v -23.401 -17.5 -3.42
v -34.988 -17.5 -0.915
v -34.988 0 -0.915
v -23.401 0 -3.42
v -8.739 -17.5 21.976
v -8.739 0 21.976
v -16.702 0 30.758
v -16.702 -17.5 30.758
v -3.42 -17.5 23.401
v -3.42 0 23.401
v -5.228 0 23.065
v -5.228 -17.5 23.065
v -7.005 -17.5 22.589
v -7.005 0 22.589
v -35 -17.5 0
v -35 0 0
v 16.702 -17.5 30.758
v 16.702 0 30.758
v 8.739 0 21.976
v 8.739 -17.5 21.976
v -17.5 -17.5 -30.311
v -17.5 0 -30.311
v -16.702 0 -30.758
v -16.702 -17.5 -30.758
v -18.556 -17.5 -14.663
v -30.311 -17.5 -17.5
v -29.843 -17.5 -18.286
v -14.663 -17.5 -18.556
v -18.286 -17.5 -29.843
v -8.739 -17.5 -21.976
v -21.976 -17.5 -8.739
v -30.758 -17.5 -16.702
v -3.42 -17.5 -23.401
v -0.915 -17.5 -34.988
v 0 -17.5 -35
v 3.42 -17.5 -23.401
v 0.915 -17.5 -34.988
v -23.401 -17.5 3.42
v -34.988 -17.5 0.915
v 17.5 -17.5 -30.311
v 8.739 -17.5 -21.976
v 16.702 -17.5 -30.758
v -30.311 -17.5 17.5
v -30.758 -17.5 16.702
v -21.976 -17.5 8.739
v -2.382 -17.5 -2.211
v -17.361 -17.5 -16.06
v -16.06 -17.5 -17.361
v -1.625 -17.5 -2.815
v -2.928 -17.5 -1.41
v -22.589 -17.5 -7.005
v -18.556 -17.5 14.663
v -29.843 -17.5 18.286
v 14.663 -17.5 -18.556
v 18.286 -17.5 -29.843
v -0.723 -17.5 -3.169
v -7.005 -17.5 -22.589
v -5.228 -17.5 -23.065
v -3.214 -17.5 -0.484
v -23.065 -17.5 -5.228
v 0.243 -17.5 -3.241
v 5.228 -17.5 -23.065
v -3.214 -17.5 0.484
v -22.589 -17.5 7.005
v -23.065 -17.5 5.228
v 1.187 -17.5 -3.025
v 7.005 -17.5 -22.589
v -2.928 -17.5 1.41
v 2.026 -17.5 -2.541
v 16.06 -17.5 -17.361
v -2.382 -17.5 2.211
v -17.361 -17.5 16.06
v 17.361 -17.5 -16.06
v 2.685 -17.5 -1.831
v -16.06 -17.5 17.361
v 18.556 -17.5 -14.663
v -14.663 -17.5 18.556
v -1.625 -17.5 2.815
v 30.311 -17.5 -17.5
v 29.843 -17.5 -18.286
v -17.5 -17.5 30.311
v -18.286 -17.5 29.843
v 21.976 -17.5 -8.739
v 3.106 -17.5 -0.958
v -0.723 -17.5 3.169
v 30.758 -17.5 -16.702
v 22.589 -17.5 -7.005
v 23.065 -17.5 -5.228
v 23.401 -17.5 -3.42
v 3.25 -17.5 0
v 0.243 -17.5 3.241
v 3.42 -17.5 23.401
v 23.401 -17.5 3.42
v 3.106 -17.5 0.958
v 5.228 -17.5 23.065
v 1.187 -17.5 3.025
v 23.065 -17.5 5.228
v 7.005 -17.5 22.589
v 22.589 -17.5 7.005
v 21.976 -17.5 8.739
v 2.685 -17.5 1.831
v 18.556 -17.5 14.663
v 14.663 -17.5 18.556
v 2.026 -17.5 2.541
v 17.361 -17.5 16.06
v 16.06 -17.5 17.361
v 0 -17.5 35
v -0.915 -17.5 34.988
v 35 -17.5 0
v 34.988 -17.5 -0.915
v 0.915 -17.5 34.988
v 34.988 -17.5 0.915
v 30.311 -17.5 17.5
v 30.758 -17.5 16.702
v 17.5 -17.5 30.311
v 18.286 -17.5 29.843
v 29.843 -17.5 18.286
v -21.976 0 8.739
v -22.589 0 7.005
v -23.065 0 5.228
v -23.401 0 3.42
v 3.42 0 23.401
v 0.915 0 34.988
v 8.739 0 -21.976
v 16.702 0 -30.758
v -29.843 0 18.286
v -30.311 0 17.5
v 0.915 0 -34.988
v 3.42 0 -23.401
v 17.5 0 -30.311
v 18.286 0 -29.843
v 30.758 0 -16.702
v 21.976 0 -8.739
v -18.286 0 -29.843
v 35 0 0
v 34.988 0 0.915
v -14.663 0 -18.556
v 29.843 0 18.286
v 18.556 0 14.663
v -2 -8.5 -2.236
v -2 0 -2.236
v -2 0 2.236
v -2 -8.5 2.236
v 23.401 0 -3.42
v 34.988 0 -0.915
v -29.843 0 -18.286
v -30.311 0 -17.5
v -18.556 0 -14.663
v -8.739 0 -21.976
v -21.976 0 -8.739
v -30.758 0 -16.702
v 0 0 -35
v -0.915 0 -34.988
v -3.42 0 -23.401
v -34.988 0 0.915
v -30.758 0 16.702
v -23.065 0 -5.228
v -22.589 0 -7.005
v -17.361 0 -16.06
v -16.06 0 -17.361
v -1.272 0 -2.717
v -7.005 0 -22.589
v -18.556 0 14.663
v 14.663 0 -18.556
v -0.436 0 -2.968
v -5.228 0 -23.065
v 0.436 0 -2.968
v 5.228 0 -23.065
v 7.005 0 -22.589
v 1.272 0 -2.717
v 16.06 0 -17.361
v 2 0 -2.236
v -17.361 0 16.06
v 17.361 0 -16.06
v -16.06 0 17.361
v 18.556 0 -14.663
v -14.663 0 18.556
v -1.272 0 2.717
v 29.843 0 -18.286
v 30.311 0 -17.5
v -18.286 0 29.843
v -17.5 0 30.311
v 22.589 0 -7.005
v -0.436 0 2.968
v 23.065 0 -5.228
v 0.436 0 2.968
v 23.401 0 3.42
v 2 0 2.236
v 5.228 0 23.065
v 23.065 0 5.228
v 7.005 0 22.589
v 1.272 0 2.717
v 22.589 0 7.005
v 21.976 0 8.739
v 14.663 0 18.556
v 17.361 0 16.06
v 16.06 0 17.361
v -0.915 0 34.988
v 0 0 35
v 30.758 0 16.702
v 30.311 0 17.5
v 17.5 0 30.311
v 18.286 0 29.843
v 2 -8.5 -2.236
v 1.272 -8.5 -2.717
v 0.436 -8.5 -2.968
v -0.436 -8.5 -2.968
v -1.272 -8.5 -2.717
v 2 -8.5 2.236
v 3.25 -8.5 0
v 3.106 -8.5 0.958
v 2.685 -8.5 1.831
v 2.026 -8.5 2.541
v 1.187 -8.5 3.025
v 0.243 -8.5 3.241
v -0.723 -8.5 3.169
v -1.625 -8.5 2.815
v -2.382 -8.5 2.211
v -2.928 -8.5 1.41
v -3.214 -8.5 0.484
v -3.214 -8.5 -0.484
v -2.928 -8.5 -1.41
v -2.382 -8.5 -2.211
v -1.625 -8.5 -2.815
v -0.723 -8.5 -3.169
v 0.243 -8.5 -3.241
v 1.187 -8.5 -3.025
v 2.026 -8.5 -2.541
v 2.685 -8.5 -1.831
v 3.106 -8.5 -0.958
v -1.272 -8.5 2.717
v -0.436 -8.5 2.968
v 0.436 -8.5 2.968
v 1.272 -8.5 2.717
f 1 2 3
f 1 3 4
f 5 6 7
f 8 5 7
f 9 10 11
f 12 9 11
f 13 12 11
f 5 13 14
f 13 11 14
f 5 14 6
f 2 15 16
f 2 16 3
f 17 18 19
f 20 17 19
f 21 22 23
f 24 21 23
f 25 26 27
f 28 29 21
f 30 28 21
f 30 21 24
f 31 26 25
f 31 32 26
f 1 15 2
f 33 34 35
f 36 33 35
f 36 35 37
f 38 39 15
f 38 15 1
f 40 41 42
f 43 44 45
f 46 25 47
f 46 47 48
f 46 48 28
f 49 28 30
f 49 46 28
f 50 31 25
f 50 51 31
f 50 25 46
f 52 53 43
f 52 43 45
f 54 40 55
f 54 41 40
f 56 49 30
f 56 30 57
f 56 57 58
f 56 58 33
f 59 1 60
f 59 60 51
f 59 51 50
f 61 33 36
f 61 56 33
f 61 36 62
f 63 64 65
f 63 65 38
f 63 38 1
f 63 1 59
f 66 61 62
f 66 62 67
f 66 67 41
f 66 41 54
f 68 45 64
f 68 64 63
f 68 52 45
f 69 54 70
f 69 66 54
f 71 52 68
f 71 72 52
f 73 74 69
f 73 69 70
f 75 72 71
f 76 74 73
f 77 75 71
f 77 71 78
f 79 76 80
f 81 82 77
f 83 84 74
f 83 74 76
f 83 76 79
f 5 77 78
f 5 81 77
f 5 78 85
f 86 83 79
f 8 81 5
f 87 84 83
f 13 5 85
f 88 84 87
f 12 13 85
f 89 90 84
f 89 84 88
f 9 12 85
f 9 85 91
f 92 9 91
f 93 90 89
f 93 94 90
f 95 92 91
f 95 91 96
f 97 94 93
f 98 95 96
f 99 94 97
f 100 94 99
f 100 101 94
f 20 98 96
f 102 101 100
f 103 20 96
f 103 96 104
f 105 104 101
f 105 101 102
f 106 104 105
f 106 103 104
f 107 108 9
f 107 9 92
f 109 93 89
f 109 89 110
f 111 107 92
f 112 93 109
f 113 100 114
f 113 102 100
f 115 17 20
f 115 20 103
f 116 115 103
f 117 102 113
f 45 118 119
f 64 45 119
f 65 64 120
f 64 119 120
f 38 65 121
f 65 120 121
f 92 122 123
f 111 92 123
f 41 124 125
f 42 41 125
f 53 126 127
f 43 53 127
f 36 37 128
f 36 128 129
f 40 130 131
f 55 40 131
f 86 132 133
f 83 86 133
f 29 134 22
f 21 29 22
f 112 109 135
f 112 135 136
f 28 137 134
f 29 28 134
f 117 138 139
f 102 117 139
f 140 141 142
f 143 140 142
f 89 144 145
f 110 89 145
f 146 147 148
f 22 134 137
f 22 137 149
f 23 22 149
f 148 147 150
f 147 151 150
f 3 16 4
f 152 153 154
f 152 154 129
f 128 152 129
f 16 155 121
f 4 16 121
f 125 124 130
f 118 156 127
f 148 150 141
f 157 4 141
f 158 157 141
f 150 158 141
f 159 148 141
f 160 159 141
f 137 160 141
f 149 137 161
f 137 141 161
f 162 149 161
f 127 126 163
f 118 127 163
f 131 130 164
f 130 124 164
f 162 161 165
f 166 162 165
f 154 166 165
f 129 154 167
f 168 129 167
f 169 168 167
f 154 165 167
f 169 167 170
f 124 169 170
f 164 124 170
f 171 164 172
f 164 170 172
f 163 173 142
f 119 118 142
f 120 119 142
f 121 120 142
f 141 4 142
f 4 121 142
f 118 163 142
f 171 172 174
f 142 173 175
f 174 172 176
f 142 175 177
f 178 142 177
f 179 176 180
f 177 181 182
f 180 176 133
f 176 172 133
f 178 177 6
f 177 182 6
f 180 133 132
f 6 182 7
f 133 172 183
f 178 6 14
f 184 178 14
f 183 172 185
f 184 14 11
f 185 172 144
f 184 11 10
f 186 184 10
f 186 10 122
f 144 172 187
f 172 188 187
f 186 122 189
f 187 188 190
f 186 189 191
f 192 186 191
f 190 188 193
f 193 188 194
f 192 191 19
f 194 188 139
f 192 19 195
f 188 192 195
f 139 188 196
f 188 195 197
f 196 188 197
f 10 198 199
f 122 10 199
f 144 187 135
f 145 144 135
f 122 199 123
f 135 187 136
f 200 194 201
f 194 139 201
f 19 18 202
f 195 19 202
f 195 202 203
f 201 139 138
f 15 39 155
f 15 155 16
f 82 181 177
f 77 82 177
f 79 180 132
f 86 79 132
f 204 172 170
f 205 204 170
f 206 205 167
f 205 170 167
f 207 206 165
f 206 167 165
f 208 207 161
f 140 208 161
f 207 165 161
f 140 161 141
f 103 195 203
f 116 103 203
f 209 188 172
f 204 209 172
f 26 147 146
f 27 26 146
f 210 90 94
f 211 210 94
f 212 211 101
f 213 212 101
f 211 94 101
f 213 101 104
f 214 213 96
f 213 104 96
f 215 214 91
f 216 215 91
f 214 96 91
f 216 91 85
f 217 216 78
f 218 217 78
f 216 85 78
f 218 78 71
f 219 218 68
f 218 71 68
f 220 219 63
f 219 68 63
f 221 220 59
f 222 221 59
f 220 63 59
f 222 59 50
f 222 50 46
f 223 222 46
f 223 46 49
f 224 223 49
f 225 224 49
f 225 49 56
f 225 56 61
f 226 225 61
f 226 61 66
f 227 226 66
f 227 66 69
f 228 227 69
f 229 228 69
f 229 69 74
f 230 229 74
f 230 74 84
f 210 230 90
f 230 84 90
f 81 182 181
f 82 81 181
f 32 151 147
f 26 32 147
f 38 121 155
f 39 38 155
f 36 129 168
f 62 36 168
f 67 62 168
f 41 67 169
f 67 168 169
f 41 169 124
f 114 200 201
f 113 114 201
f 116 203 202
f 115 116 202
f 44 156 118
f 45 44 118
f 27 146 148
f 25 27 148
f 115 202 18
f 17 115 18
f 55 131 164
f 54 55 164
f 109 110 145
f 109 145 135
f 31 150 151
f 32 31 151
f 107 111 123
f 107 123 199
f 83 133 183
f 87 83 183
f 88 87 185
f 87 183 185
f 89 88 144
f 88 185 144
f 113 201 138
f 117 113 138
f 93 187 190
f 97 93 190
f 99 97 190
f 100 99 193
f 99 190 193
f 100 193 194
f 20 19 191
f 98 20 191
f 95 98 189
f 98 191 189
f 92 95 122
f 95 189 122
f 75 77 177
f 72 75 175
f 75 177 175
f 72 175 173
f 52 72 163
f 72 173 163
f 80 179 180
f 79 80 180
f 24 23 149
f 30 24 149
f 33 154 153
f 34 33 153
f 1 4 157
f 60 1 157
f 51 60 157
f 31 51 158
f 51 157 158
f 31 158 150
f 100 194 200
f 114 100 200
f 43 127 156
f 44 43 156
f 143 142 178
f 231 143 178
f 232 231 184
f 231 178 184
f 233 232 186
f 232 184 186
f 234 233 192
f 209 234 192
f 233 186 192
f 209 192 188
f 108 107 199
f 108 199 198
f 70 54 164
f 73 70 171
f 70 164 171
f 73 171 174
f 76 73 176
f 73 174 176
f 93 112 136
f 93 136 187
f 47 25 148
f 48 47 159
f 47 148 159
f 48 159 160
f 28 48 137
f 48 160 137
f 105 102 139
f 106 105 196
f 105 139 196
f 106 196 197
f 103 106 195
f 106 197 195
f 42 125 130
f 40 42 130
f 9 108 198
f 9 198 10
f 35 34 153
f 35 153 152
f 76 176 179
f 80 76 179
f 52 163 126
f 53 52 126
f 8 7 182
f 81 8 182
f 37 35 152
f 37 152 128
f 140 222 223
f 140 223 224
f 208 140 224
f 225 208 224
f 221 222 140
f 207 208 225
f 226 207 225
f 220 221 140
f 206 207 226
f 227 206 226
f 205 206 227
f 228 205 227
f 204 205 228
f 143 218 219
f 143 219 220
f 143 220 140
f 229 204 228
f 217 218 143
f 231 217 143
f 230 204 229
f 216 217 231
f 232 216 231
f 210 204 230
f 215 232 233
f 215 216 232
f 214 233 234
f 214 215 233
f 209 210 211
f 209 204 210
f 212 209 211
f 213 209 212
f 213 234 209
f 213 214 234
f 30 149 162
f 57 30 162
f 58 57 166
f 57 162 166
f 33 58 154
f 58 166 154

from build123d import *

# Parameters (mm, degrees)
F1_DEPTH = 17.5
F3_DEPTH = 9
F4_R     = 3.25
F5_DEPTH = 9


with BuildPart() as f1:
    # F0 (on Front) → F1 (new body)
    with BuildSketch(Plane.XZ):
        with BuildLine():
            ThreePointArc((23.401412, -3.42), (23.587771, -1.714511), (23.65, 0))
            ThreePointArc((23.65, 0), (23.587771, 1.714511), (23.401412, 3.42))
            ThreePointArc((23.401412, 3.42), (22.844146, 6.12107), (21.976218, 8.738899))
            ThreePointArc((21.976218, 8.738899), (20.481501, 11.825), (18.556218, 14.662513))
            ThreePointArc((18.556218, 14.662513), (16.723075, 16.723075), (14.662513, 18.556218))
            ThreePointArc((14.662513, 18.556218), (11.825, 20.481501), (8.738899, 21.976218))
            ThreePointArc((8.738899, 21.976218), (6.12107, 22.844146), (3.42, 23.401412))
            ThreePointArc((3.42, 23.401412), (0, 23.65), (-3.42, 23.401412))
            ThreePointArc((-3.42, 23.401412), (-6.12107, 22.844146), (-8.738899, 21.976218))
            ThreePointArc((-8.738899, 21.976218), (-11.825, 20.481501), (-14.662513, 18.556218))
            ThreePointArc((-14.662513, 18.556218), (-16.723075, 16.723075), (-18.556218, 14.662513))
            ThreePointArc((-18.556218, 14.662513), (-20.481501, 11.825), (-21.976218, 8.738899))
            ThreePointArc((-21.976218, 8.738899), (-22.844146, 6.12107), (-23.401412, 3.42))
            ThreePointArc((-23.401412, 3.42), (-23.65, 0), (-23.401412, -3.42))
            ThreePointArc((-23.401412, -3.42), (-22.844146, -6.12107), (-21.976218, -8.738899))
            ThreePointArc((-21.976218, -8.738899), (-20.481501, -11.825), (-18.556218, -14.662513))
            ThreePointArc((-18.556218, -14.662513), (-16.723075, -16.723075), (-14.662513, -18.556218))
            ThreePointArc((-14.662513, -18.556218), (-11.825, -20.481501), (-8.738899, -21.976218))
            ThreePointArc((-8.738899, -21.976218), (-6.12107, -22.844146), (-3.42, -23.401412))
            ThreePointArc((-3.42, -23.401412), (0, -23.65), (3.42, -23.401412))
            ThreePointArc((3.42, -23.401412), (6.12107, -22.844146), (8.738899, -21.976218))
            ThreePointArc((8.738899, -21.976218), (11.825, -20.481501), (14.662513, -18.556218))
            ThreePointArc((14.662513, -18.556218), (16.723075, -16.723075), (18.556218, -14.662513))
            ThreePointArc((18.556218, -14.662513), (20.481501, -11.825), (21.976218, -8.738899))
            ThreePointArc((21.976218, -8.738899), (22.844146, -6.12107), (23.401412, -3.42))
        make_face()
        with BuildLine():
            ThreePointArc((23.401412, 3.42), (23.587771, 1.714511), (23.65, 0))
            ThreePointArc((23.65, 0), (23.587771, -1.714511), (23.401412, -3.42))
            Line((23.401412, -3.42), (34.98804, -0.914922))
            Line((34.98804, -0.914922), (35, 0))
            Line((35, 0), (34.98804, 0.914922))
            Line((34.98804, 0.914922), (23.401412, 3.42))
        make_face()
        with BuildLine():
            ThreePointArc((18.556218, 14.662513), (20.481501, 11.825), (21.976218, 8.738899))
            Line((21.976218, 8.738899), (30.757992, 16.701674))
            Line((30.757992, 16.701674), (30.310889, 17.5))
            Line((30.310889, 17.5), (29.84307, 18.286365))
            Line((29.84307, 18.286365), (18.556218, 14.662513))
        make_face()
        with BuildLine():
            Line((30.757992, -16.701674), (21.976218, -8.738899))
            ThreePointArc((21.976218, -8.738899), (20.481501, -11.825), (18.556218, -14.662513))
            Line((18.556218, -14.662513), (29.84307, -18.286365))
            Line((29.84307, -18.286365), (30.310889, -17.5))
            Line((30.310889, -17.5), (30.757992, -16.701674))
        make_face()
        with BuildLine():
            ThreePointArc((8.738899, 21.976218), (11.825, 20.481501), (14.662513, 18.556218))
            Line((14.662513, 18.556218), (18.286365, 29.84307))
            Line((18.286365, 29.84307), (17.5, 30.310889))
            Line((17.5, 30.310889), (16.701674, 30.757992))
            Line((16.701674, 30.757992), (8.738899, 21.976218))
        make_face()
        with BuildLine():
            Line((18.286365, -29.84307), (14.662513, -18.556218))
            ThreePointArc((14.662513, -18.556218), (11.825, -20.481501), (8.738899, -21.976218))
            Line((8.738899, -21.976218), (16.701674, -30.757992))
            Line((16.701674, -30.757992), (17.5, -30.310889))
            Line((17.5, -30.310889), (18.286365, -29.84307))
        make_face()
        with BuildLine():
            ThreePointArc((-3.42, 23.401412), (0, 23.65), (3.42, 23.401412))
            Line((3.42, 23.401412), (0.914922, 34.98804))
            Line((0.914922, 34.98804), (0, 35))
            Line((0, 35), (-0.914922, 34.98804))
            Line((-0.914922, 34.98804), (-3.42, 23.401412))
        make_face()
        with BuildLine():
            Line((0.914922, -34.98804), (3.42, -23.401412))
            ThreePointArc((3.42, -23.401412), (0, -23.65), (-3.42, -23.401412))
            Line((-3.42, -23.401412), (-0.914922, -34.98804))
            Line((-0.914922, -34.98804), (0, -35))
            Line((0, -35), (0.914922, -34.98804))
        make_face()
        with BuildLine():
            ThreePointArc((-14.662513, 18.556218), (-11.825, 20.481501), (-8.738899, 21.976218))
            Line((-8.738899, 21.976218), (-16.701674, 30.757992))
            Line((-16.701674, 30.757992), (-17.5, 30.310889))
            Line((-17.5, 30.310889), (-18.286365, 29.84307))
            Line((-18.286365, 29.84307), (-14.662513, 18.556218))
        make_face()
        with BuildLine():
            Line((-16.701674, -30.757992), (-8.738899, -21.976218))
            ThreePointArc((-8.738899, -21.976218), (-11.825, -20.481501), (-14.662513, -18.556218))
            Line((-14.662513, -18.556218), (-18.286365, -29.84307))
            Line((-18.286365, -29.84307), (-17.5, -30.310889))
            Line((-17.5, -30.310889), (-16.701674, -30.757992))
        make_face()
        with BuildLine():
            ThreePointArc((-21.976218, 8.738899), (-20.481501, 11.825), (-18.556218, 14.662513))
            Line((-18.556218, 14.662513), (-29.84307, 18.286365))
            Line((-29.84307, 18.286365), (-30.310889, 17.5))
            Line((-30.310889, 17.5), (-30.757992, 16.701674))
            Line((-30.757992, 16.701674), (-21.976218, 8.738899))
        make_face()
        with BuildLine():
            Line((-29.84307, -18.286365), (-18.556218, -14.662513))
            ThreePointArc((-18.556218, -14.662513), (-20.481501, -11.825), (-21.976218, -8.738899))
            Line((-21.976218, -8.738899), (-30.757992, -16.701674))
            Line((-30.757992, -16.701674), (-30.310889, -17.5))
            Line((-30.310889, -17.5), (-29.84307, -18.286365))
        make_face()
        with BuildLine():
            ThreePointArc((-23.401412, -3.42), (-23.65, 0), (-23.401412, 3.42))
            Line((-23.401412, 3.42), (-34.98804, 0.914922))
            Line((-34.98804, 0.914922), (-35, 0))
            Line((-35, 0), (-34.98804, -0.914922))
            Line((-34.98804, -0.914922), (-23.401412, -3.42))
        make_face()
    extrude(amount=F1_DEPTH)

    # F2 (on face) → F3 (cut)
    with BuildSketch(Plane(origin=(0, 0, 0), x_dir=(-1, 0, 0), z_dir=(0, 1, 0))):
        with BuildLine():
            Line((2, -2.236068), (2, 2.236068))
            ThreePointArc((2, 2.236068), (0, 3), (-2, 2.236068))
            Line((-2, 2.236068), (-2, -2.236068))
            ThreePointArc((-2, -2.236068), (0, -3), (2, -2.236068))
        make_face()
    extrude(amount=-F3_DEPTH, mode=Mode.SUBTRACT)

    # F4 (on face) → F5 (cut)
    with BuildSketch(Plane.XZ.offset(17.5)):
        Circle(F4_R)
    extrude(amount=-F5_DEPTH, mode=Mode.SUBTRACT)


solid = f1.part
